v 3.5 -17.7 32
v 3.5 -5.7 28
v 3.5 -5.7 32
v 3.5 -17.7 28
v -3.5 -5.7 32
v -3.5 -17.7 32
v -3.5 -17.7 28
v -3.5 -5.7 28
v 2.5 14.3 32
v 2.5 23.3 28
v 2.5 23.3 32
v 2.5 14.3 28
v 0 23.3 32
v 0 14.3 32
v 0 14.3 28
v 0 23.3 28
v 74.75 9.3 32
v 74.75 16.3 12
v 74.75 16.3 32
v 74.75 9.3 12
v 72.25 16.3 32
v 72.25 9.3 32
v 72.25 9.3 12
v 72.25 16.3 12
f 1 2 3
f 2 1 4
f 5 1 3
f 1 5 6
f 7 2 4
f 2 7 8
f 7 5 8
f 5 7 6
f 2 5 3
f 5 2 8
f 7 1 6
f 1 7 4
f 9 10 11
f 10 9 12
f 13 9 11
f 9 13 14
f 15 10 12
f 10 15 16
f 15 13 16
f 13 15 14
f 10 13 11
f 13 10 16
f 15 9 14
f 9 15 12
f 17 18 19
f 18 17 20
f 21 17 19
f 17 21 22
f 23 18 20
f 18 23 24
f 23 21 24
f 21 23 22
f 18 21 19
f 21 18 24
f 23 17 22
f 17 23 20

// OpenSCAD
// file: case_cover.scad
/* ======================================================================
 *
 *       Filename:  case_cover.scad
 *
 *    Description:  case for Arduino Uno with lora transmitter shield
 *
 *        Version:  1.0
 *        Created:  12 03 2017
 *       Revision:  none
 *       Compiler:  gcc
 *
 *         Author:  Sebastien Chassot, sebastien.chassot@@etu.hesge.ch
 *
 * =====================================================================
 */

border = 2.5;
hole_d = 1.5;

//case_cover();

/* body X extrude */
module case_cover() {

    difference() {
                
        union() {
                
            linear_extrude(height = border, center = false, $fn=80)
                import("./sec_base_cover.dxf");
    
            /* connector USB */
            translate([-3.5, -17.7, -4])
                cube([7, 12, 4]);
            
            /* connector alim */        
            translate([0, 14.3, -4])
                cube([border, 9, 4]);
            
            /* connector antenna */        
            translate([69.75+border, 9.3, -20])
                cube([border, 7, 20]);
        }
        translate([0, 4.8, 0])
        cylinder(d=hole_d, h=10, center=true, $fn=100);
        translate([72, -22, 0])
            cylinder(d=hole_d, h= 10, center=true, $fn=100);
    }   
}
// file: case_main.scad
/* ======================================================================
 *
 *       Filename:  case_main.scad
 *
 *    Description:  case for Arduino Uno with lora transmitter shield
 *
 *        Version:  1.0
 *        Created:  12 03 2017
 *       Revision:  none
 *       Compiler:  gcc
 *
 *         Author:  Sebastien Chassot, sebastien.chassot@@etu.hesge.ch
 *
 * =====================================================================
 */

encoder_d = 9.3;
toth = 34.5;
border = 2.5;
antenna_d = 8;

//case_main();

/* body X extrude */
module case_main() {

    difference() {
            
        linear_extrude(height = toth, center = false, $fn=80)
            import("./sec_base.dxf");

        translate([0,0,border])
            linear_extrude(height = toth, center = false, $fn=80)
                import("./sec_in0.dxf");
        
        translate([0,0,border+0.5])
            linear_extrude(height = toth, center = false, $fn=80)
                import("./sec_in1.dxf");

        translate([0,0,toth-border])
            linear_extrude(height = border+1, center = false, $fn=80)
                import("./sec_cover.dxf");
        
        /* hole */
        translate([12.5, 4.8, -1])
            cylinder(d=encoder_d, h=toth+2, $fn=100);
    
        translate([30, -50, 31.5])
            cube([20,100,10]);
    
        translate([74, 12.8, 8]) {
            rotate([0,-90,0]) {
                linear_extrude(height=2*border, center=true) {
                    circle(d=antenna_d, $fn=100);
                    translate([0,-antenna_d/2,0])
                        square([150,antenna_d]);
                }
            }
        }
        translate([border+1, -18.7, 16])
            rotate([0, 270, 0])
                linear_extrude(h=2*border)
                    square([25, 14]);
    
        translate([border+1, 13.8, 17])
            rotate([0, 270, 0])
                linear_extrude(h=2*border)
                    square([25, 10]);

    }
                
}
// main file
/* ======================================================================
 *
 *       Filename:  case_cover.scad
 *
 *    Description:  case for Arduino Uno with lora transmitter shield
 *
 *        Version:  1.0
 *        Created:  12 03 2017
 *       Revision:  none
 *       Compiler:  gcc
 *
 *         Author:  Sebastien Chassot, sebastien.chassot@@etu.hesge.ch
 *
 * =====================================================================
 */


use <case_main.scad>
use <case_cover.scad>

translate([0, 0, 32])
rotate([0,0,0])
    color([0,1,0]) case_cover();

color([0,0,1]) case_main();
